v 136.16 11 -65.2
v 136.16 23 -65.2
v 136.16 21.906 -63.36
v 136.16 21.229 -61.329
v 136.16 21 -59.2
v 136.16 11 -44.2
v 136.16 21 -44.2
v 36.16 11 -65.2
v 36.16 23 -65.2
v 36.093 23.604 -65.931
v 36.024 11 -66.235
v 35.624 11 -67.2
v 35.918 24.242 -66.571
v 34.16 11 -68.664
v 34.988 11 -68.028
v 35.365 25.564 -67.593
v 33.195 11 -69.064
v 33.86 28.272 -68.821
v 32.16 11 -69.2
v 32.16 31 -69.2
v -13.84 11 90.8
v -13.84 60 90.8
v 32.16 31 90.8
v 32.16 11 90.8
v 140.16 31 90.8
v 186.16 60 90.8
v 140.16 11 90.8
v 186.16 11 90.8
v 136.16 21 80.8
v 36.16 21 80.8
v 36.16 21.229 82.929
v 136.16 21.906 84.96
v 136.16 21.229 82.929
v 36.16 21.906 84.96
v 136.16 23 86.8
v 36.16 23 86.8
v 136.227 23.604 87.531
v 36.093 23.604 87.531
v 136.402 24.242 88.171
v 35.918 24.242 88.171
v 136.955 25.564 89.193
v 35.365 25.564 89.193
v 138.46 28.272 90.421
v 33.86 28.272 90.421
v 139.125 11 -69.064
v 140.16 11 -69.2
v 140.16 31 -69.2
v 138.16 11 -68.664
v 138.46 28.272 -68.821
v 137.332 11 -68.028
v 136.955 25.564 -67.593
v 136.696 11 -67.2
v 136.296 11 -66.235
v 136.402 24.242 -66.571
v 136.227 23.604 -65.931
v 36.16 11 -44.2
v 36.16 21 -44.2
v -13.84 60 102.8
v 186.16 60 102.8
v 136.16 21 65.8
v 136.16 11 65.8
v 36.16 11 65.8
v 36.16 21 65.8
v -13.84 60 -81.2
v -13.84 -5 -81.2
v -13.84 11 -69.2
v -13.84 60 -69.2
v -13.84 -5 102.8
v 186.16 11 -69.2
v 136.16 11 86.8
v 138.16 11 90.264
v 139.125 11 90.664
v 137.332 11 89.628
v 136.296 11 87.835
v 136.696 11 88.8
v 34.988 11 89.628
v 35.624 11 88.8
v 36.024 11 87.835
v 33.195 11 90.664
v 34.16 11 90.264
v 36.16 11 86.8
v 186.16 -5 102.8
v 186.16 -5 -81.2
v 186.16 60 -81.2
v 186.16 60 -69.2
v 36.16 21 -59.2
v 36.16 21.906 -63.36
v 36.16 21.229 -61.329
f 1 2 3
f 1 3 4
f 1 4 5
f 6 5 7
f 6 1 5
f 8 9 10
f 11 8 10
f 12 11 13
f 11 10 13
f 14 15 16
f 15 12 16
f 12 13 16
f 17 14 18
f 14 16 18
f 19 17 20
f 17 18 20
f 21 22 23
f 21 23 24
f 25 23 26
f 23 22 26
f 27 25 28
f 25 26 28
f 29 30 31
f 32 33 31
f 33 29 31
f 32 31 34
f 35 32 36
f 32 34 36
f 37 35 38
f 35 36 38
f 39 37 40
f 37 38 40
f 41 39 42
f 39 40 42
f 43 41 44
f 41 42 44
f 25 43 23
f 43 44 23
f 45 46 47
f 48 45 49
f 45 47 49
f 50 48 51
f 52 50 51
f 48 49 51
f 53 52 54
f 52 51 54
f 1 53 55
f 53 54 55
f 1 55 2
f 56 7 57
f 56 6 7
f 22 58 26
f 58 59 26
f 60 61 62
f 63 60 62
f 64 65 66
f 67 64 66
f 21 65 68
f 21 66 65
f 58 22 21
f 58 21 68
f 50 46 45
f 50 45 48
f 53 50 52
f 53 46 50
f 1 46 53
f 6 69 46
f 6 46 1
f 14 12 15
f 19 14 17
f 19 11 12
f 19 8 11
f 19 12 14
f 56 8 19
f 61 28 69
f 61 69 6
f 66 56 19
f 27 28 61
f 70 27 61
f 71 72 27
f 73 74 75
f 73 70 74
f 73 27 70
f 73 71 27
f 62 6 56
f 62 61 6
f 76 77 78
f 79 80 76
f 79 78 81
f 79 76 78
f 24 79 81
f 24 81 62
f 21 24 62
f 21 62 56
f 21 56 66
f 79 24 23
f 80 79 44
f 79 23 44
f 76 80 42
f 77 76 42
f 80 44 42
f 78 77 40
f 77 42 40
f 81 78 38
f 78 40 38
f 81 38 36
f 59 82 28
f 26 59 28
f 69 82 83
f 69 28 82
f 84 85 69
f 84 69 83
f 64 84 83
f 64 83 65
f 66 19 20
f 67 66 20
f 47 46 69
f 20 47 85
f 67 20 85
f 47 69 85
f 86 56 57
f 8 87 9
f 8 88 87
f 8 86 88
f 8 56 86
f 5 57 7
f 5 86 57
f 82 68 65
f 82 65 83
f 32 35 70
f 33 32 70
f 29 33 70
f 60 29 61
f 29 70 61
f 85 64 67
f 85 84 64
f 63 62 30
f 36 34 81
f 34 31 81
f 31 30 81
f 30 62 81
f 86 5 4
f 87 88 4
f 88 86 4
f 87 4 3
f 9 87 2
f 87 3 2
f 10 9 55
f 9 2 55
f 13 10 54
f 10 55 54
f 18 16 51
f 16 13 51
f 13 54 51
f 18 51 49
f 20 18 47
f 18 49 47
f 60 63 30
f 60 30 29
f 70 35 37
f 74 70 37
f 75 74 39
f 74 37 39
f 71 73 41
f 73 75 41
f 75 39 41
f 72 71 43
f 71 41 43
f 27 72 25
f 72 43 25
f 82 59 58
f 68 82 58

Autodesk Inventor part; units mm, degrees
ref_plane "YZ Plane" through (0, 0, 0) normal (1, 0, 0) x (0, 1, 0)
ref_plane "XZ Plane" through (0, 0, 0) normal (0, 1, 0) x (-1, 0, 0)
ref_plane "XY Plane" through (0, 0, 0) normal (0, 0, 1) x (1, 0, 0)
sketch "Sketch1" plane through (0, 0, 0) normal (0, 1, 0) x (-1, 0, 0)
  line L0 (13.84, 90.8) -> (-186.16, 90.8)
  line L1 (-186.16, 90.8) -> (-186.16, -69.2)
  line L2 (-186.16, -69.2) -> (13.84, -69.2)
  line L3 (13.84, -69.2) -> (13.84, 90.8)
  point P0 (0, 0)
  dimension "d0" = 160
  dimension "d1" = 200
extrude "Extrusion1" add sketch "Sketch1" along normal blind 11
sketch "Sketch2" plane through (186.16, 0, 90.8) normal (1, 0, 0) x (0, 0, -1)
  line L0 (0, 0) -> (0, 11) projected
  line L1 (0, 0) -> (-12, 0)
  line L2 (-12, 0) -> (-12, 60)
  line L3 (-12, 60) -> (0, 60)
  line L4 (0, 60) -> (0, 0)
  line L5 (160, 0) -> (160, 11) projected
  line L6 (160, 0) -> (172, 0)
  line L7 (172, 0) -> (172, 60)
  line L8 (172, 60) -> (160, 60)
  line L9 (160, 60) -> (160, 0)
  point P0 (90.8, 0)
  point P1 (0, 11)
  dimension "d4" = 60
  dimension "d5" = 60
  dimension "d6" = 12
  dimension "d17" = 12
extrude "Extrusion2" add sketch "Sketch2" against normal up to surface (200 mm away)
sketch "Sketch3" plane through (0, 0, 0) normal (0, -1, 0) x (1, 0, 0)
  line L0 (186.16, 102.8) -> (186.16, -81.2) projected
  line L1 (186.16, 102.8) -> (-13.84, 102.8) projected
  line L2 (-13.84, -81.2) -> (-13.84, 102.8) projected
  line L3 (186.16, -81.2) -> (-13.84, -81.2) projected
  point P0 (0, 0)
extrude "Extrusion3" add sketch "Sketch3" along normal blind 5
sketch "Sketch7" plane through (0, 11, 0) normal (0, 1, 0) x (1, 0, 0)
  line L0 (186.16, -90.8) -> (-13.84, -90.8) projected
  line L1 (36.16, -90.8) -> (136.16, -90.8)
  line L2 (136.16, -90.8) -> (136.16, -65.8)
  line L3 (136.16, -65.8) -> (36.16, -65.8)
  line L4 (36.16, -65.8) -> (36.16, -90.8)
  line L5 (186.16, 69.2) -> (-13.84, 69.2) projected
  line L6 (36.16, 69.2) -> (136.16, 69.2)
  line L7 (136.16, 69.2) -> (136.16, 44.2)
  line L8 (136.16, 44.2) -> (36.16, 44.2)
  line L9 (36.16, 44.2) -> (36.16, 69.2)
  line L10 (-13.84, 69.2) -> (-13.84, -90.8) projected
  line L11 (186.16, -90.8) -> (186.16, 69.2) projected
  point P0 (0, 0)
  point P1 (136.16, 56.7)
  dimension "d18" = 25
  dimension "d19" = 25
  dimension "d20" = 50
  dimension "d21" = 50
  dimension "d22" = 50
  dimension "d23" = 50
extrude "Extrusion6" add sketch "Sketch7" along normal blind 10 contours L0 L4 L3 L2 | L7 L8 L9 L5
fillet "Fillet1" radius 4 4 edges at (36.16, 16, -69.2) (36.16, 16, 90.8) (136.16, 16, -69.2) (136.16, 16, 90.8)
fillet "Fillet2" radius 10 4 edges at (138.16, 21, -69.2) (34.16, 21, -69.2) (34.16, 21, 90.8) (138.16, 21, 90.8)
sketch "Sketch8" plane through (-13.84, 11, 90.8) normal (-1, 0, 0) x (0, 0, 1)
  line L0 (-160, 0) -> (0, 0)
  line L1 (0, 0) -> (0, -19)
  line L2 (0, -19) -> (-160, -19)
  line L3 (-160, -19) -> (-160, 0)
  line L4 (-172, 49) -> (12, 49)
  line L5 (12, 49) -> (12, -16)
  line L6 (12, -16) -> (-172, -16)
  line L7 (-172, -16) -> (-172, 49)
  point P0 (-90.8, -11)
properties part number "Y_karetka" material "Aluminum 6061"
